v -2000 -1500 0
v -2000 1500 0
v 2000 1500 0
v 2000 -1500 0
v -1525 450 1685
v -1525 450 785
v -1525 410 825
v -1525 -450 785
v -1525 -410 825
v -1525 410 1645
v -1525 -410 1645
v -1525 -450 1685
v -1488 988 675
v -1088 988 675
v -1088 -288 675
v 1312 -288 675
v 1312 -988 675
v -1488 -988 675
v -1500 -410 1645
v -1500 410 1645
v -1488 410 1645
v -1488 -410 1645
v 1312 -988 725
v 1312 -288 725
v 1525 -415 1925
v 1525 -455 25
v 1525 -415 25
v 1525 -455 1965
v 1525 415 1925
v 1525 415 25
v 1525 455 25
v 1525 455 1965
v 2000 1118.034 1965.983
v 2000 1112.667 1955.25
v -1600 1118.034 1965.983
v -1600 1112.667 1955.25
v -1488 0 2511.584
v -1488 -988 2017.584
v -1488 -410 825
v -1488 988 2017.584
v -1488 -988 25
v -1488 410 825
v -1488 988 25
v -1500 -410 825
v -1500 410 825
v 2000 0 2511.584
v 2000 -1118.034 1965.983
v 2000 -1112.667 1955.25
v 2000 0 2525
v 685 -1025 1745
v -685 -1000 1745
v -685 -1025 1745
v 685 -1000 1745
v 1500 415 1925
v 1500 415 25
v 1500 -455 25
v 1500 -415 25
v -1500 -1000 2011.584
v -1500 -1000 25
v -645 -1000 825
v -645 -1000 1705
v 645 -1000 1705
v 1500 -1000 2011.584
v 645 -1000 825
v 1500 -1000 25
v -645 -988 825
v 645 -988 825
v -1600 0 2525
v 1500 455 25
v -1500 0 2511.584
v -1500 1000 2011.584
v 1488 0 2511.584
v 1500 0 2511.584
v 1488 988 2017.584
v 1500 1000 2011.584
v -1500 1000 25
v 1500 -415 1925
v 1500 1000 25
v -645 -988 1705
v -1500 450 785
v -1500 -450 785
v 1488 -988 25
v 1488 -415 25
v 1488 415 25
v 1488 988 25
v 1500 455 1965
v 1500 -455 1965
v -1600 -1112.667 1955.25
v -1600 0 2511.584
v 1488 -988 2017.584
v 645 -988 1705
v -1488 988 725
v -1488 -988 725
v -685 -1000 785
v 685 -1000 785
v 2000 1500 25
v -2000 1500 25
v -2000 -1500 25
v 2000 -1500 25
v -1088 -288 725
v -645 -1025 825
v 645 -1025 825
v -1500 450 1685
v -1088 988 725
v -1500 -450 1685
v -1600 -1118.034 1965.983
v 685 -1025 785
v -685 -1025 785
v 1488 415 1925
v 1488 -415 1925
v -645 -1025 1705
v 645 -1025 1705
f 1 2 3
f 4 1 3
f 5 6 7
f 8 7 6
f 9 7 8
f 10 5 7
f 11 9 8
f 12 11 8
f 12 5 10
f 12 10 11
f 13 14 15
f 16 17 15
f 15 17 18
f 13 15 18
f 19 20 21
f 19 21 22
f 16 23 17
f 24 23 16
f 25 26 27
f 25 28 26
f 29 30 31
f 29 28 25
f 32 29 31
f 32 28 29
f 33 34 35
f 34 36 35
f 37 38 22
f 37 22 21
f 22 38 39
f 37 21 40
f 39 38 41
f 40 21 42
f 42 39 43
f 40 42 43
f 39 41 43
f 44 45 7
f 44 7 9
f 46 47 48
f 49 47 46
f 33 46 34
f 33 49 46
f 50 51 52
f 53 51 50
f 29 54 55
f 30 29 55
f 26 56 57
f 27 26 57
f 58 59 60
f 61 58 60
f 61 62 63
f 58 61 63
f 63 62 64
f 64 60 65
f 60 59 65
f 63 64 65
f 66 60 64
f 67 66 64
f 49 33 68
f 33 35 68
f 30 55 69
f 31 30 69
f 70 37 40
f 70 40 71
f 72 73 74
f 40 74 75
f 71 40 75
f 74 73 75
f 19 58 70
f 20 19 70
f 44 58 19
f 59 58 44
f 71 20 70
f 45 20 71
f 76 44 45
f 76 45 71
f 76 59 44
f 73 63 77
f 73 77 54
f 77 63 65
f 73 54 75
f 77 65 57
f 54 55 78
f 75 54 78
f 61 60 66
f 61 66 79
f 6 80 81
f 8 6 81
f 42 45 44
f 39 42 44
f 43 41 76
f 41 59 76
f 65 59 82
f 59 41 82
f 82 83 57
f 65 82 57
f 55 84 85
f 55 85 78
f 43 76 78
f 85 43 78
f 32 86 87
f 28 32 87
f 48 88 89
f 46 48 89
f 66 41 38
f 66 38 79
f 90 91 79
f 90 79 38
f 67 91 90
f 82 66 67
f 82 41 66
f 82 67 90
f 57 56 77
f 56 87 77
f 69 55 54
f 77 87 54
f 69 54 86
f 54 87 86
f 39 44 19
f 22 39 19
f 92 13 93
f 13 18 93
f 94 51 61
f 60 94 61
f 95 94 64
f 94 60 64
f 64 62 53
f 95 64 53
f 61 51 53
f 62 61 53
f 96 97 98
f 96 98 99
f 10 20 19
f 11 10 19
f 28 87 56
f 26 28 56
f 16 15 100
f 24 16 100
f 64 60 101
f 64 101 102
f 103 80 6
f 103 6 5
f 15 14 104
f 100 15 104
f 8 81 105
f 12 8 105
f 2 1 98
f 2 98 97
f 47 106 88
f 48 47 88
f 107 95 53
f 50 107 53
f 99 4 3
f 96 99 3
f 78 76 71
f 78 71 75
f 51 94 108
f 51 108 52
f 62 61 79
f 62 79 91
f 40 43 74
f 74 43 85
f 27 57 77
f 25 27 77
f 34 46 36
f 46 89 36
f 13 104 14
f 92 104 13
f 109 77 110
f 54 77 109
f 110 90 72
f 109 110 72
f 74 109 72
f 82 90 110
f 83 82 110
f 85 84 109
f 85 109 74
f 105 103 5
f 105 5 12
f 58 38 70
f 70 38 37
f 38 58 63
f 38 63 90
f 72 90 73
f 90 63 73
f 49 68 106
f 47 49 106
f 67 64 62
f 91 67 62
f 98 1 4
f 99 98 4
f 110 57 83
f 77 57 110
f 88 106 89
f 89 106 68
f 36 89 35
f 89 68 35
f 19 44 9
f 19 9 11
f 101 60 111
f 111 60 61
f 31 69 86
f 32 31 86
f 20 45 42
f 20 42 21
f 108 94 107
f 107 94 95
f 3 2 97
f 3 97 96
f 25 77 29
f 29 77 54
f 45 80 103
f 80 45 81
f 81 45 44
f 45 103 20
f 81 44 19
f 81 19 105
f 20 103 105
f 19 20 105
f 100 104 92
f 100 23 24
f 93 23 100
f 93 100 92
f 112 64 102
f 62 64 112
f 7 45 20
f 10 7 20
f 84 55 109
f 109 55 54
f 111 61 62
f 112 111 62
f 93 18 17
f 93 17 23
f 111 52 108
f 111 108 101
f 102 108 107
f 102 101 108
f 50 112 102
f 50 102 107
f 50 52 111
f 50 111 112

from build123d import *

# Parameters (mm, degrees)
F0_W      = 4000
F0_H      = 3000
F1_DEPTH  = 25
F2_W      = 3000
F2_H      = 2000
F2_W_2    = 2976
F2_H_2    = 1976
F3_DEPTH  = 2500
F4_W      = 900
F4_H      = 900
F4_W_2    = 820
F4_H_2    = 820
F5_DEPTH  = 25
F6_DEPTH  = 12
F7_W      = 1370
F7_H      = 960
F7_W_2    = 1290
F7_H_2    = 880
F8_DEPTH  = 25
F9_DEPTH  = 12
F11_DEPTH = 25
F10_W     = 830
F10_H     = 1900
F12_DEPTH = 25
F13_DEPTH = 3000
F14_DEPTH = 3100
F15_DEPTH = 500
F16_W     = 700
F16_H     = 50
F17_DEPTH = 2800
F18_W     = 400
F18_H     = 50
F19_DEPTH = 1276


with BuildPart() as f1:
    # F0 (on Top) → F1 (new body)
    with BuildSketch(Plane.XY):
        Rectangle(F0_W, F0_H)
    extrude(amount=F1_DEPTH)


with BuildPart() as f3:
    # F2 (on face) → F3 (new body)
    with BuildSketch(Plane.XY.offset(25)):
        Rectangle(F2_W, F2_H)
        Rectangle(F2_W_2, F2_H_2, mode=Mode.SUBTRACT)
    extrude(amount=F3_DEPTH)

    # F4 (on face) → F6 (cut, through all)
    with BuildSketch(Plane(origin=(-1500, 0, 0), x_dir=(0, -1, 0), z_dir=(-1, 0, 0))):
        with Locations((0, 1235)):
            Rectangle(F4_W_2, F4_H_2)
    extrude(amount=-F6_DEPTH, mode=Mode.SUBTRACT)

    # F7 (on face) → F9 (cut, through all)
    with BuildSketch(Plane.XZ.offset(1000)):
        with Locations((0, 1265)):
            Rectangle(F7_W_2, F7_H_2)
    extrude(amount=-F9_DEPTH, mode=Mode.SUBTRACT)

    # F10 (on face) → F12 (cut)
    with BuildSketch(Plane.YZ.offset(1500)):
        with Locations((0, 975)):
            Rectangle(F10_W, F10_H)
    extrude(amount=-F12_DEPTH, mode=Mode.SUBTRACT)

    # F10 (on face) → F13 (cut, through all)
    with BuildSketch(Plane.YZ.offset(1500)):
        Polygon((-1000, 2525), (-1000, 2025), (0, 2525), align=None)
        Polygon((0, 2525), (1000, 2025), (1000, 2525), align=None)
        Polygon((-1000, 2025), (-1000, 2011.583592135), (0, 2511.583592135), (1000, 2011.583592135), (1000, 2025), (0, 2525), align=None)
    extrude(amount=-F13_DEPTH, mode=Mode.SUBTRACT)


with BuildPart() as f5:
    # F4 (on face) → F5 (new body)
    with BuildSketch(Plane(origin=(-1500, 0, 0), x_dir=(0, -1, 0), z_dir=(-1, 0, 0))):
        with Locations((0, 1235)):
            Rectangle(F4_W, F4_H)
        with Locations((0, 1235)):
            Rectangle(F4_W_2, F4_H_2, mode=Mode.SUBTRACT)
    extrude(amount=F5_DEPTH)


with BuildPart() as f8:
    # F7 (on face) → F8 (new body)
    with BuildSketch(Plane.XZ.offset(1000)):
        with Locations((0, 1265)):
            Rectangle(F7_W, F7_H)
        with Locations((0, 1265)):
            Rectangle(F7_W_2, F7_H_2, mode=Mode.SUBTRACT)
    extrude(amount=F8_DEPTH)


with BuildPart() as f11:
    # F10 (on face) → F11 (new body)
    with BuildSketch(Plane.YZ.offset(1500)):
        Polygon((-455, 25), (-415, 25), (-415, 1925), (415, 1925), (415, 25), (455, 25), (455, 1965), (-455, 1965), align=None)
    extrude(amount=F11_DEPTH)


with BuildPart() as f14:
    # F10 (on face) → F14 (new body)
    with BuildSketch(Plane.YZ.offset(1500)):
        Polygon((-1000, 2025), (-1000, 2011.583592135), (0, 2511.583592135), (1000, 2011.583592135), (1000, 2025), (0, 2525), align=None)
        Polygon((1000, 2025), (1000, 2011.583592135), (1112.6674256039, 1955.2498793331), (1118.0339887499, 1965.9830056251), align=None)
        Polygon((-1112.6674256039, 1955.2498793331), (-1000, 2011.583592135), (-1000, 2025), (-1118.0339887499, 1965.9830056251), align=None)
    extrude(amount=-F14_DEPTH)

    # F10 (on face) → F15 (join)
    with BuildSketch(Plane.YZ.offset(1500)):
        Polygon((-1112.6674256039, 1955.2498793331), (-1000, 2011.583592135), (-1000, 2025), (-1118.0339887499, 1965.9830056251), align=None)
        Polygon((-1000, 2025), (-1000, 2011.583592135), (0, 2511.583592135), (1000, 2011.583592135), (1000, 2025), (0, 2525), align=None)
        Polygon((1000, 2025), (1000, 2011.583592135), (1112.6674256039, 1955.2498793331), (1118.0339887499, 1965.9830056251), align=None)
    extrude(amount=F15_DEPTH)


with BuildPart() as f17:
    # F16 (on face) → F17 (new body)
    with BuildSketch(Plane.YZ.offset(-1488)):
        with Locations((-638, 700)):
            Rectangle(F16_W, F16_H)
    extrude(amount=F17_DEPTH)

    # F18 (on face) → F19 (join, through all)
    with BuildSketch(Plane(origin=(0, -288, 0), x_dir=(-1, 0, 0), z_dir=(0, 1, 0))):
        with Locations((1288, 700)):
            Rectangle(F18_W, F18_H)
    extrude(amount=F19_DEPTH)


solid = Compound([f1.part, f3.part, f5.part, f8.part, f11.part, f14.part, f17.part])
